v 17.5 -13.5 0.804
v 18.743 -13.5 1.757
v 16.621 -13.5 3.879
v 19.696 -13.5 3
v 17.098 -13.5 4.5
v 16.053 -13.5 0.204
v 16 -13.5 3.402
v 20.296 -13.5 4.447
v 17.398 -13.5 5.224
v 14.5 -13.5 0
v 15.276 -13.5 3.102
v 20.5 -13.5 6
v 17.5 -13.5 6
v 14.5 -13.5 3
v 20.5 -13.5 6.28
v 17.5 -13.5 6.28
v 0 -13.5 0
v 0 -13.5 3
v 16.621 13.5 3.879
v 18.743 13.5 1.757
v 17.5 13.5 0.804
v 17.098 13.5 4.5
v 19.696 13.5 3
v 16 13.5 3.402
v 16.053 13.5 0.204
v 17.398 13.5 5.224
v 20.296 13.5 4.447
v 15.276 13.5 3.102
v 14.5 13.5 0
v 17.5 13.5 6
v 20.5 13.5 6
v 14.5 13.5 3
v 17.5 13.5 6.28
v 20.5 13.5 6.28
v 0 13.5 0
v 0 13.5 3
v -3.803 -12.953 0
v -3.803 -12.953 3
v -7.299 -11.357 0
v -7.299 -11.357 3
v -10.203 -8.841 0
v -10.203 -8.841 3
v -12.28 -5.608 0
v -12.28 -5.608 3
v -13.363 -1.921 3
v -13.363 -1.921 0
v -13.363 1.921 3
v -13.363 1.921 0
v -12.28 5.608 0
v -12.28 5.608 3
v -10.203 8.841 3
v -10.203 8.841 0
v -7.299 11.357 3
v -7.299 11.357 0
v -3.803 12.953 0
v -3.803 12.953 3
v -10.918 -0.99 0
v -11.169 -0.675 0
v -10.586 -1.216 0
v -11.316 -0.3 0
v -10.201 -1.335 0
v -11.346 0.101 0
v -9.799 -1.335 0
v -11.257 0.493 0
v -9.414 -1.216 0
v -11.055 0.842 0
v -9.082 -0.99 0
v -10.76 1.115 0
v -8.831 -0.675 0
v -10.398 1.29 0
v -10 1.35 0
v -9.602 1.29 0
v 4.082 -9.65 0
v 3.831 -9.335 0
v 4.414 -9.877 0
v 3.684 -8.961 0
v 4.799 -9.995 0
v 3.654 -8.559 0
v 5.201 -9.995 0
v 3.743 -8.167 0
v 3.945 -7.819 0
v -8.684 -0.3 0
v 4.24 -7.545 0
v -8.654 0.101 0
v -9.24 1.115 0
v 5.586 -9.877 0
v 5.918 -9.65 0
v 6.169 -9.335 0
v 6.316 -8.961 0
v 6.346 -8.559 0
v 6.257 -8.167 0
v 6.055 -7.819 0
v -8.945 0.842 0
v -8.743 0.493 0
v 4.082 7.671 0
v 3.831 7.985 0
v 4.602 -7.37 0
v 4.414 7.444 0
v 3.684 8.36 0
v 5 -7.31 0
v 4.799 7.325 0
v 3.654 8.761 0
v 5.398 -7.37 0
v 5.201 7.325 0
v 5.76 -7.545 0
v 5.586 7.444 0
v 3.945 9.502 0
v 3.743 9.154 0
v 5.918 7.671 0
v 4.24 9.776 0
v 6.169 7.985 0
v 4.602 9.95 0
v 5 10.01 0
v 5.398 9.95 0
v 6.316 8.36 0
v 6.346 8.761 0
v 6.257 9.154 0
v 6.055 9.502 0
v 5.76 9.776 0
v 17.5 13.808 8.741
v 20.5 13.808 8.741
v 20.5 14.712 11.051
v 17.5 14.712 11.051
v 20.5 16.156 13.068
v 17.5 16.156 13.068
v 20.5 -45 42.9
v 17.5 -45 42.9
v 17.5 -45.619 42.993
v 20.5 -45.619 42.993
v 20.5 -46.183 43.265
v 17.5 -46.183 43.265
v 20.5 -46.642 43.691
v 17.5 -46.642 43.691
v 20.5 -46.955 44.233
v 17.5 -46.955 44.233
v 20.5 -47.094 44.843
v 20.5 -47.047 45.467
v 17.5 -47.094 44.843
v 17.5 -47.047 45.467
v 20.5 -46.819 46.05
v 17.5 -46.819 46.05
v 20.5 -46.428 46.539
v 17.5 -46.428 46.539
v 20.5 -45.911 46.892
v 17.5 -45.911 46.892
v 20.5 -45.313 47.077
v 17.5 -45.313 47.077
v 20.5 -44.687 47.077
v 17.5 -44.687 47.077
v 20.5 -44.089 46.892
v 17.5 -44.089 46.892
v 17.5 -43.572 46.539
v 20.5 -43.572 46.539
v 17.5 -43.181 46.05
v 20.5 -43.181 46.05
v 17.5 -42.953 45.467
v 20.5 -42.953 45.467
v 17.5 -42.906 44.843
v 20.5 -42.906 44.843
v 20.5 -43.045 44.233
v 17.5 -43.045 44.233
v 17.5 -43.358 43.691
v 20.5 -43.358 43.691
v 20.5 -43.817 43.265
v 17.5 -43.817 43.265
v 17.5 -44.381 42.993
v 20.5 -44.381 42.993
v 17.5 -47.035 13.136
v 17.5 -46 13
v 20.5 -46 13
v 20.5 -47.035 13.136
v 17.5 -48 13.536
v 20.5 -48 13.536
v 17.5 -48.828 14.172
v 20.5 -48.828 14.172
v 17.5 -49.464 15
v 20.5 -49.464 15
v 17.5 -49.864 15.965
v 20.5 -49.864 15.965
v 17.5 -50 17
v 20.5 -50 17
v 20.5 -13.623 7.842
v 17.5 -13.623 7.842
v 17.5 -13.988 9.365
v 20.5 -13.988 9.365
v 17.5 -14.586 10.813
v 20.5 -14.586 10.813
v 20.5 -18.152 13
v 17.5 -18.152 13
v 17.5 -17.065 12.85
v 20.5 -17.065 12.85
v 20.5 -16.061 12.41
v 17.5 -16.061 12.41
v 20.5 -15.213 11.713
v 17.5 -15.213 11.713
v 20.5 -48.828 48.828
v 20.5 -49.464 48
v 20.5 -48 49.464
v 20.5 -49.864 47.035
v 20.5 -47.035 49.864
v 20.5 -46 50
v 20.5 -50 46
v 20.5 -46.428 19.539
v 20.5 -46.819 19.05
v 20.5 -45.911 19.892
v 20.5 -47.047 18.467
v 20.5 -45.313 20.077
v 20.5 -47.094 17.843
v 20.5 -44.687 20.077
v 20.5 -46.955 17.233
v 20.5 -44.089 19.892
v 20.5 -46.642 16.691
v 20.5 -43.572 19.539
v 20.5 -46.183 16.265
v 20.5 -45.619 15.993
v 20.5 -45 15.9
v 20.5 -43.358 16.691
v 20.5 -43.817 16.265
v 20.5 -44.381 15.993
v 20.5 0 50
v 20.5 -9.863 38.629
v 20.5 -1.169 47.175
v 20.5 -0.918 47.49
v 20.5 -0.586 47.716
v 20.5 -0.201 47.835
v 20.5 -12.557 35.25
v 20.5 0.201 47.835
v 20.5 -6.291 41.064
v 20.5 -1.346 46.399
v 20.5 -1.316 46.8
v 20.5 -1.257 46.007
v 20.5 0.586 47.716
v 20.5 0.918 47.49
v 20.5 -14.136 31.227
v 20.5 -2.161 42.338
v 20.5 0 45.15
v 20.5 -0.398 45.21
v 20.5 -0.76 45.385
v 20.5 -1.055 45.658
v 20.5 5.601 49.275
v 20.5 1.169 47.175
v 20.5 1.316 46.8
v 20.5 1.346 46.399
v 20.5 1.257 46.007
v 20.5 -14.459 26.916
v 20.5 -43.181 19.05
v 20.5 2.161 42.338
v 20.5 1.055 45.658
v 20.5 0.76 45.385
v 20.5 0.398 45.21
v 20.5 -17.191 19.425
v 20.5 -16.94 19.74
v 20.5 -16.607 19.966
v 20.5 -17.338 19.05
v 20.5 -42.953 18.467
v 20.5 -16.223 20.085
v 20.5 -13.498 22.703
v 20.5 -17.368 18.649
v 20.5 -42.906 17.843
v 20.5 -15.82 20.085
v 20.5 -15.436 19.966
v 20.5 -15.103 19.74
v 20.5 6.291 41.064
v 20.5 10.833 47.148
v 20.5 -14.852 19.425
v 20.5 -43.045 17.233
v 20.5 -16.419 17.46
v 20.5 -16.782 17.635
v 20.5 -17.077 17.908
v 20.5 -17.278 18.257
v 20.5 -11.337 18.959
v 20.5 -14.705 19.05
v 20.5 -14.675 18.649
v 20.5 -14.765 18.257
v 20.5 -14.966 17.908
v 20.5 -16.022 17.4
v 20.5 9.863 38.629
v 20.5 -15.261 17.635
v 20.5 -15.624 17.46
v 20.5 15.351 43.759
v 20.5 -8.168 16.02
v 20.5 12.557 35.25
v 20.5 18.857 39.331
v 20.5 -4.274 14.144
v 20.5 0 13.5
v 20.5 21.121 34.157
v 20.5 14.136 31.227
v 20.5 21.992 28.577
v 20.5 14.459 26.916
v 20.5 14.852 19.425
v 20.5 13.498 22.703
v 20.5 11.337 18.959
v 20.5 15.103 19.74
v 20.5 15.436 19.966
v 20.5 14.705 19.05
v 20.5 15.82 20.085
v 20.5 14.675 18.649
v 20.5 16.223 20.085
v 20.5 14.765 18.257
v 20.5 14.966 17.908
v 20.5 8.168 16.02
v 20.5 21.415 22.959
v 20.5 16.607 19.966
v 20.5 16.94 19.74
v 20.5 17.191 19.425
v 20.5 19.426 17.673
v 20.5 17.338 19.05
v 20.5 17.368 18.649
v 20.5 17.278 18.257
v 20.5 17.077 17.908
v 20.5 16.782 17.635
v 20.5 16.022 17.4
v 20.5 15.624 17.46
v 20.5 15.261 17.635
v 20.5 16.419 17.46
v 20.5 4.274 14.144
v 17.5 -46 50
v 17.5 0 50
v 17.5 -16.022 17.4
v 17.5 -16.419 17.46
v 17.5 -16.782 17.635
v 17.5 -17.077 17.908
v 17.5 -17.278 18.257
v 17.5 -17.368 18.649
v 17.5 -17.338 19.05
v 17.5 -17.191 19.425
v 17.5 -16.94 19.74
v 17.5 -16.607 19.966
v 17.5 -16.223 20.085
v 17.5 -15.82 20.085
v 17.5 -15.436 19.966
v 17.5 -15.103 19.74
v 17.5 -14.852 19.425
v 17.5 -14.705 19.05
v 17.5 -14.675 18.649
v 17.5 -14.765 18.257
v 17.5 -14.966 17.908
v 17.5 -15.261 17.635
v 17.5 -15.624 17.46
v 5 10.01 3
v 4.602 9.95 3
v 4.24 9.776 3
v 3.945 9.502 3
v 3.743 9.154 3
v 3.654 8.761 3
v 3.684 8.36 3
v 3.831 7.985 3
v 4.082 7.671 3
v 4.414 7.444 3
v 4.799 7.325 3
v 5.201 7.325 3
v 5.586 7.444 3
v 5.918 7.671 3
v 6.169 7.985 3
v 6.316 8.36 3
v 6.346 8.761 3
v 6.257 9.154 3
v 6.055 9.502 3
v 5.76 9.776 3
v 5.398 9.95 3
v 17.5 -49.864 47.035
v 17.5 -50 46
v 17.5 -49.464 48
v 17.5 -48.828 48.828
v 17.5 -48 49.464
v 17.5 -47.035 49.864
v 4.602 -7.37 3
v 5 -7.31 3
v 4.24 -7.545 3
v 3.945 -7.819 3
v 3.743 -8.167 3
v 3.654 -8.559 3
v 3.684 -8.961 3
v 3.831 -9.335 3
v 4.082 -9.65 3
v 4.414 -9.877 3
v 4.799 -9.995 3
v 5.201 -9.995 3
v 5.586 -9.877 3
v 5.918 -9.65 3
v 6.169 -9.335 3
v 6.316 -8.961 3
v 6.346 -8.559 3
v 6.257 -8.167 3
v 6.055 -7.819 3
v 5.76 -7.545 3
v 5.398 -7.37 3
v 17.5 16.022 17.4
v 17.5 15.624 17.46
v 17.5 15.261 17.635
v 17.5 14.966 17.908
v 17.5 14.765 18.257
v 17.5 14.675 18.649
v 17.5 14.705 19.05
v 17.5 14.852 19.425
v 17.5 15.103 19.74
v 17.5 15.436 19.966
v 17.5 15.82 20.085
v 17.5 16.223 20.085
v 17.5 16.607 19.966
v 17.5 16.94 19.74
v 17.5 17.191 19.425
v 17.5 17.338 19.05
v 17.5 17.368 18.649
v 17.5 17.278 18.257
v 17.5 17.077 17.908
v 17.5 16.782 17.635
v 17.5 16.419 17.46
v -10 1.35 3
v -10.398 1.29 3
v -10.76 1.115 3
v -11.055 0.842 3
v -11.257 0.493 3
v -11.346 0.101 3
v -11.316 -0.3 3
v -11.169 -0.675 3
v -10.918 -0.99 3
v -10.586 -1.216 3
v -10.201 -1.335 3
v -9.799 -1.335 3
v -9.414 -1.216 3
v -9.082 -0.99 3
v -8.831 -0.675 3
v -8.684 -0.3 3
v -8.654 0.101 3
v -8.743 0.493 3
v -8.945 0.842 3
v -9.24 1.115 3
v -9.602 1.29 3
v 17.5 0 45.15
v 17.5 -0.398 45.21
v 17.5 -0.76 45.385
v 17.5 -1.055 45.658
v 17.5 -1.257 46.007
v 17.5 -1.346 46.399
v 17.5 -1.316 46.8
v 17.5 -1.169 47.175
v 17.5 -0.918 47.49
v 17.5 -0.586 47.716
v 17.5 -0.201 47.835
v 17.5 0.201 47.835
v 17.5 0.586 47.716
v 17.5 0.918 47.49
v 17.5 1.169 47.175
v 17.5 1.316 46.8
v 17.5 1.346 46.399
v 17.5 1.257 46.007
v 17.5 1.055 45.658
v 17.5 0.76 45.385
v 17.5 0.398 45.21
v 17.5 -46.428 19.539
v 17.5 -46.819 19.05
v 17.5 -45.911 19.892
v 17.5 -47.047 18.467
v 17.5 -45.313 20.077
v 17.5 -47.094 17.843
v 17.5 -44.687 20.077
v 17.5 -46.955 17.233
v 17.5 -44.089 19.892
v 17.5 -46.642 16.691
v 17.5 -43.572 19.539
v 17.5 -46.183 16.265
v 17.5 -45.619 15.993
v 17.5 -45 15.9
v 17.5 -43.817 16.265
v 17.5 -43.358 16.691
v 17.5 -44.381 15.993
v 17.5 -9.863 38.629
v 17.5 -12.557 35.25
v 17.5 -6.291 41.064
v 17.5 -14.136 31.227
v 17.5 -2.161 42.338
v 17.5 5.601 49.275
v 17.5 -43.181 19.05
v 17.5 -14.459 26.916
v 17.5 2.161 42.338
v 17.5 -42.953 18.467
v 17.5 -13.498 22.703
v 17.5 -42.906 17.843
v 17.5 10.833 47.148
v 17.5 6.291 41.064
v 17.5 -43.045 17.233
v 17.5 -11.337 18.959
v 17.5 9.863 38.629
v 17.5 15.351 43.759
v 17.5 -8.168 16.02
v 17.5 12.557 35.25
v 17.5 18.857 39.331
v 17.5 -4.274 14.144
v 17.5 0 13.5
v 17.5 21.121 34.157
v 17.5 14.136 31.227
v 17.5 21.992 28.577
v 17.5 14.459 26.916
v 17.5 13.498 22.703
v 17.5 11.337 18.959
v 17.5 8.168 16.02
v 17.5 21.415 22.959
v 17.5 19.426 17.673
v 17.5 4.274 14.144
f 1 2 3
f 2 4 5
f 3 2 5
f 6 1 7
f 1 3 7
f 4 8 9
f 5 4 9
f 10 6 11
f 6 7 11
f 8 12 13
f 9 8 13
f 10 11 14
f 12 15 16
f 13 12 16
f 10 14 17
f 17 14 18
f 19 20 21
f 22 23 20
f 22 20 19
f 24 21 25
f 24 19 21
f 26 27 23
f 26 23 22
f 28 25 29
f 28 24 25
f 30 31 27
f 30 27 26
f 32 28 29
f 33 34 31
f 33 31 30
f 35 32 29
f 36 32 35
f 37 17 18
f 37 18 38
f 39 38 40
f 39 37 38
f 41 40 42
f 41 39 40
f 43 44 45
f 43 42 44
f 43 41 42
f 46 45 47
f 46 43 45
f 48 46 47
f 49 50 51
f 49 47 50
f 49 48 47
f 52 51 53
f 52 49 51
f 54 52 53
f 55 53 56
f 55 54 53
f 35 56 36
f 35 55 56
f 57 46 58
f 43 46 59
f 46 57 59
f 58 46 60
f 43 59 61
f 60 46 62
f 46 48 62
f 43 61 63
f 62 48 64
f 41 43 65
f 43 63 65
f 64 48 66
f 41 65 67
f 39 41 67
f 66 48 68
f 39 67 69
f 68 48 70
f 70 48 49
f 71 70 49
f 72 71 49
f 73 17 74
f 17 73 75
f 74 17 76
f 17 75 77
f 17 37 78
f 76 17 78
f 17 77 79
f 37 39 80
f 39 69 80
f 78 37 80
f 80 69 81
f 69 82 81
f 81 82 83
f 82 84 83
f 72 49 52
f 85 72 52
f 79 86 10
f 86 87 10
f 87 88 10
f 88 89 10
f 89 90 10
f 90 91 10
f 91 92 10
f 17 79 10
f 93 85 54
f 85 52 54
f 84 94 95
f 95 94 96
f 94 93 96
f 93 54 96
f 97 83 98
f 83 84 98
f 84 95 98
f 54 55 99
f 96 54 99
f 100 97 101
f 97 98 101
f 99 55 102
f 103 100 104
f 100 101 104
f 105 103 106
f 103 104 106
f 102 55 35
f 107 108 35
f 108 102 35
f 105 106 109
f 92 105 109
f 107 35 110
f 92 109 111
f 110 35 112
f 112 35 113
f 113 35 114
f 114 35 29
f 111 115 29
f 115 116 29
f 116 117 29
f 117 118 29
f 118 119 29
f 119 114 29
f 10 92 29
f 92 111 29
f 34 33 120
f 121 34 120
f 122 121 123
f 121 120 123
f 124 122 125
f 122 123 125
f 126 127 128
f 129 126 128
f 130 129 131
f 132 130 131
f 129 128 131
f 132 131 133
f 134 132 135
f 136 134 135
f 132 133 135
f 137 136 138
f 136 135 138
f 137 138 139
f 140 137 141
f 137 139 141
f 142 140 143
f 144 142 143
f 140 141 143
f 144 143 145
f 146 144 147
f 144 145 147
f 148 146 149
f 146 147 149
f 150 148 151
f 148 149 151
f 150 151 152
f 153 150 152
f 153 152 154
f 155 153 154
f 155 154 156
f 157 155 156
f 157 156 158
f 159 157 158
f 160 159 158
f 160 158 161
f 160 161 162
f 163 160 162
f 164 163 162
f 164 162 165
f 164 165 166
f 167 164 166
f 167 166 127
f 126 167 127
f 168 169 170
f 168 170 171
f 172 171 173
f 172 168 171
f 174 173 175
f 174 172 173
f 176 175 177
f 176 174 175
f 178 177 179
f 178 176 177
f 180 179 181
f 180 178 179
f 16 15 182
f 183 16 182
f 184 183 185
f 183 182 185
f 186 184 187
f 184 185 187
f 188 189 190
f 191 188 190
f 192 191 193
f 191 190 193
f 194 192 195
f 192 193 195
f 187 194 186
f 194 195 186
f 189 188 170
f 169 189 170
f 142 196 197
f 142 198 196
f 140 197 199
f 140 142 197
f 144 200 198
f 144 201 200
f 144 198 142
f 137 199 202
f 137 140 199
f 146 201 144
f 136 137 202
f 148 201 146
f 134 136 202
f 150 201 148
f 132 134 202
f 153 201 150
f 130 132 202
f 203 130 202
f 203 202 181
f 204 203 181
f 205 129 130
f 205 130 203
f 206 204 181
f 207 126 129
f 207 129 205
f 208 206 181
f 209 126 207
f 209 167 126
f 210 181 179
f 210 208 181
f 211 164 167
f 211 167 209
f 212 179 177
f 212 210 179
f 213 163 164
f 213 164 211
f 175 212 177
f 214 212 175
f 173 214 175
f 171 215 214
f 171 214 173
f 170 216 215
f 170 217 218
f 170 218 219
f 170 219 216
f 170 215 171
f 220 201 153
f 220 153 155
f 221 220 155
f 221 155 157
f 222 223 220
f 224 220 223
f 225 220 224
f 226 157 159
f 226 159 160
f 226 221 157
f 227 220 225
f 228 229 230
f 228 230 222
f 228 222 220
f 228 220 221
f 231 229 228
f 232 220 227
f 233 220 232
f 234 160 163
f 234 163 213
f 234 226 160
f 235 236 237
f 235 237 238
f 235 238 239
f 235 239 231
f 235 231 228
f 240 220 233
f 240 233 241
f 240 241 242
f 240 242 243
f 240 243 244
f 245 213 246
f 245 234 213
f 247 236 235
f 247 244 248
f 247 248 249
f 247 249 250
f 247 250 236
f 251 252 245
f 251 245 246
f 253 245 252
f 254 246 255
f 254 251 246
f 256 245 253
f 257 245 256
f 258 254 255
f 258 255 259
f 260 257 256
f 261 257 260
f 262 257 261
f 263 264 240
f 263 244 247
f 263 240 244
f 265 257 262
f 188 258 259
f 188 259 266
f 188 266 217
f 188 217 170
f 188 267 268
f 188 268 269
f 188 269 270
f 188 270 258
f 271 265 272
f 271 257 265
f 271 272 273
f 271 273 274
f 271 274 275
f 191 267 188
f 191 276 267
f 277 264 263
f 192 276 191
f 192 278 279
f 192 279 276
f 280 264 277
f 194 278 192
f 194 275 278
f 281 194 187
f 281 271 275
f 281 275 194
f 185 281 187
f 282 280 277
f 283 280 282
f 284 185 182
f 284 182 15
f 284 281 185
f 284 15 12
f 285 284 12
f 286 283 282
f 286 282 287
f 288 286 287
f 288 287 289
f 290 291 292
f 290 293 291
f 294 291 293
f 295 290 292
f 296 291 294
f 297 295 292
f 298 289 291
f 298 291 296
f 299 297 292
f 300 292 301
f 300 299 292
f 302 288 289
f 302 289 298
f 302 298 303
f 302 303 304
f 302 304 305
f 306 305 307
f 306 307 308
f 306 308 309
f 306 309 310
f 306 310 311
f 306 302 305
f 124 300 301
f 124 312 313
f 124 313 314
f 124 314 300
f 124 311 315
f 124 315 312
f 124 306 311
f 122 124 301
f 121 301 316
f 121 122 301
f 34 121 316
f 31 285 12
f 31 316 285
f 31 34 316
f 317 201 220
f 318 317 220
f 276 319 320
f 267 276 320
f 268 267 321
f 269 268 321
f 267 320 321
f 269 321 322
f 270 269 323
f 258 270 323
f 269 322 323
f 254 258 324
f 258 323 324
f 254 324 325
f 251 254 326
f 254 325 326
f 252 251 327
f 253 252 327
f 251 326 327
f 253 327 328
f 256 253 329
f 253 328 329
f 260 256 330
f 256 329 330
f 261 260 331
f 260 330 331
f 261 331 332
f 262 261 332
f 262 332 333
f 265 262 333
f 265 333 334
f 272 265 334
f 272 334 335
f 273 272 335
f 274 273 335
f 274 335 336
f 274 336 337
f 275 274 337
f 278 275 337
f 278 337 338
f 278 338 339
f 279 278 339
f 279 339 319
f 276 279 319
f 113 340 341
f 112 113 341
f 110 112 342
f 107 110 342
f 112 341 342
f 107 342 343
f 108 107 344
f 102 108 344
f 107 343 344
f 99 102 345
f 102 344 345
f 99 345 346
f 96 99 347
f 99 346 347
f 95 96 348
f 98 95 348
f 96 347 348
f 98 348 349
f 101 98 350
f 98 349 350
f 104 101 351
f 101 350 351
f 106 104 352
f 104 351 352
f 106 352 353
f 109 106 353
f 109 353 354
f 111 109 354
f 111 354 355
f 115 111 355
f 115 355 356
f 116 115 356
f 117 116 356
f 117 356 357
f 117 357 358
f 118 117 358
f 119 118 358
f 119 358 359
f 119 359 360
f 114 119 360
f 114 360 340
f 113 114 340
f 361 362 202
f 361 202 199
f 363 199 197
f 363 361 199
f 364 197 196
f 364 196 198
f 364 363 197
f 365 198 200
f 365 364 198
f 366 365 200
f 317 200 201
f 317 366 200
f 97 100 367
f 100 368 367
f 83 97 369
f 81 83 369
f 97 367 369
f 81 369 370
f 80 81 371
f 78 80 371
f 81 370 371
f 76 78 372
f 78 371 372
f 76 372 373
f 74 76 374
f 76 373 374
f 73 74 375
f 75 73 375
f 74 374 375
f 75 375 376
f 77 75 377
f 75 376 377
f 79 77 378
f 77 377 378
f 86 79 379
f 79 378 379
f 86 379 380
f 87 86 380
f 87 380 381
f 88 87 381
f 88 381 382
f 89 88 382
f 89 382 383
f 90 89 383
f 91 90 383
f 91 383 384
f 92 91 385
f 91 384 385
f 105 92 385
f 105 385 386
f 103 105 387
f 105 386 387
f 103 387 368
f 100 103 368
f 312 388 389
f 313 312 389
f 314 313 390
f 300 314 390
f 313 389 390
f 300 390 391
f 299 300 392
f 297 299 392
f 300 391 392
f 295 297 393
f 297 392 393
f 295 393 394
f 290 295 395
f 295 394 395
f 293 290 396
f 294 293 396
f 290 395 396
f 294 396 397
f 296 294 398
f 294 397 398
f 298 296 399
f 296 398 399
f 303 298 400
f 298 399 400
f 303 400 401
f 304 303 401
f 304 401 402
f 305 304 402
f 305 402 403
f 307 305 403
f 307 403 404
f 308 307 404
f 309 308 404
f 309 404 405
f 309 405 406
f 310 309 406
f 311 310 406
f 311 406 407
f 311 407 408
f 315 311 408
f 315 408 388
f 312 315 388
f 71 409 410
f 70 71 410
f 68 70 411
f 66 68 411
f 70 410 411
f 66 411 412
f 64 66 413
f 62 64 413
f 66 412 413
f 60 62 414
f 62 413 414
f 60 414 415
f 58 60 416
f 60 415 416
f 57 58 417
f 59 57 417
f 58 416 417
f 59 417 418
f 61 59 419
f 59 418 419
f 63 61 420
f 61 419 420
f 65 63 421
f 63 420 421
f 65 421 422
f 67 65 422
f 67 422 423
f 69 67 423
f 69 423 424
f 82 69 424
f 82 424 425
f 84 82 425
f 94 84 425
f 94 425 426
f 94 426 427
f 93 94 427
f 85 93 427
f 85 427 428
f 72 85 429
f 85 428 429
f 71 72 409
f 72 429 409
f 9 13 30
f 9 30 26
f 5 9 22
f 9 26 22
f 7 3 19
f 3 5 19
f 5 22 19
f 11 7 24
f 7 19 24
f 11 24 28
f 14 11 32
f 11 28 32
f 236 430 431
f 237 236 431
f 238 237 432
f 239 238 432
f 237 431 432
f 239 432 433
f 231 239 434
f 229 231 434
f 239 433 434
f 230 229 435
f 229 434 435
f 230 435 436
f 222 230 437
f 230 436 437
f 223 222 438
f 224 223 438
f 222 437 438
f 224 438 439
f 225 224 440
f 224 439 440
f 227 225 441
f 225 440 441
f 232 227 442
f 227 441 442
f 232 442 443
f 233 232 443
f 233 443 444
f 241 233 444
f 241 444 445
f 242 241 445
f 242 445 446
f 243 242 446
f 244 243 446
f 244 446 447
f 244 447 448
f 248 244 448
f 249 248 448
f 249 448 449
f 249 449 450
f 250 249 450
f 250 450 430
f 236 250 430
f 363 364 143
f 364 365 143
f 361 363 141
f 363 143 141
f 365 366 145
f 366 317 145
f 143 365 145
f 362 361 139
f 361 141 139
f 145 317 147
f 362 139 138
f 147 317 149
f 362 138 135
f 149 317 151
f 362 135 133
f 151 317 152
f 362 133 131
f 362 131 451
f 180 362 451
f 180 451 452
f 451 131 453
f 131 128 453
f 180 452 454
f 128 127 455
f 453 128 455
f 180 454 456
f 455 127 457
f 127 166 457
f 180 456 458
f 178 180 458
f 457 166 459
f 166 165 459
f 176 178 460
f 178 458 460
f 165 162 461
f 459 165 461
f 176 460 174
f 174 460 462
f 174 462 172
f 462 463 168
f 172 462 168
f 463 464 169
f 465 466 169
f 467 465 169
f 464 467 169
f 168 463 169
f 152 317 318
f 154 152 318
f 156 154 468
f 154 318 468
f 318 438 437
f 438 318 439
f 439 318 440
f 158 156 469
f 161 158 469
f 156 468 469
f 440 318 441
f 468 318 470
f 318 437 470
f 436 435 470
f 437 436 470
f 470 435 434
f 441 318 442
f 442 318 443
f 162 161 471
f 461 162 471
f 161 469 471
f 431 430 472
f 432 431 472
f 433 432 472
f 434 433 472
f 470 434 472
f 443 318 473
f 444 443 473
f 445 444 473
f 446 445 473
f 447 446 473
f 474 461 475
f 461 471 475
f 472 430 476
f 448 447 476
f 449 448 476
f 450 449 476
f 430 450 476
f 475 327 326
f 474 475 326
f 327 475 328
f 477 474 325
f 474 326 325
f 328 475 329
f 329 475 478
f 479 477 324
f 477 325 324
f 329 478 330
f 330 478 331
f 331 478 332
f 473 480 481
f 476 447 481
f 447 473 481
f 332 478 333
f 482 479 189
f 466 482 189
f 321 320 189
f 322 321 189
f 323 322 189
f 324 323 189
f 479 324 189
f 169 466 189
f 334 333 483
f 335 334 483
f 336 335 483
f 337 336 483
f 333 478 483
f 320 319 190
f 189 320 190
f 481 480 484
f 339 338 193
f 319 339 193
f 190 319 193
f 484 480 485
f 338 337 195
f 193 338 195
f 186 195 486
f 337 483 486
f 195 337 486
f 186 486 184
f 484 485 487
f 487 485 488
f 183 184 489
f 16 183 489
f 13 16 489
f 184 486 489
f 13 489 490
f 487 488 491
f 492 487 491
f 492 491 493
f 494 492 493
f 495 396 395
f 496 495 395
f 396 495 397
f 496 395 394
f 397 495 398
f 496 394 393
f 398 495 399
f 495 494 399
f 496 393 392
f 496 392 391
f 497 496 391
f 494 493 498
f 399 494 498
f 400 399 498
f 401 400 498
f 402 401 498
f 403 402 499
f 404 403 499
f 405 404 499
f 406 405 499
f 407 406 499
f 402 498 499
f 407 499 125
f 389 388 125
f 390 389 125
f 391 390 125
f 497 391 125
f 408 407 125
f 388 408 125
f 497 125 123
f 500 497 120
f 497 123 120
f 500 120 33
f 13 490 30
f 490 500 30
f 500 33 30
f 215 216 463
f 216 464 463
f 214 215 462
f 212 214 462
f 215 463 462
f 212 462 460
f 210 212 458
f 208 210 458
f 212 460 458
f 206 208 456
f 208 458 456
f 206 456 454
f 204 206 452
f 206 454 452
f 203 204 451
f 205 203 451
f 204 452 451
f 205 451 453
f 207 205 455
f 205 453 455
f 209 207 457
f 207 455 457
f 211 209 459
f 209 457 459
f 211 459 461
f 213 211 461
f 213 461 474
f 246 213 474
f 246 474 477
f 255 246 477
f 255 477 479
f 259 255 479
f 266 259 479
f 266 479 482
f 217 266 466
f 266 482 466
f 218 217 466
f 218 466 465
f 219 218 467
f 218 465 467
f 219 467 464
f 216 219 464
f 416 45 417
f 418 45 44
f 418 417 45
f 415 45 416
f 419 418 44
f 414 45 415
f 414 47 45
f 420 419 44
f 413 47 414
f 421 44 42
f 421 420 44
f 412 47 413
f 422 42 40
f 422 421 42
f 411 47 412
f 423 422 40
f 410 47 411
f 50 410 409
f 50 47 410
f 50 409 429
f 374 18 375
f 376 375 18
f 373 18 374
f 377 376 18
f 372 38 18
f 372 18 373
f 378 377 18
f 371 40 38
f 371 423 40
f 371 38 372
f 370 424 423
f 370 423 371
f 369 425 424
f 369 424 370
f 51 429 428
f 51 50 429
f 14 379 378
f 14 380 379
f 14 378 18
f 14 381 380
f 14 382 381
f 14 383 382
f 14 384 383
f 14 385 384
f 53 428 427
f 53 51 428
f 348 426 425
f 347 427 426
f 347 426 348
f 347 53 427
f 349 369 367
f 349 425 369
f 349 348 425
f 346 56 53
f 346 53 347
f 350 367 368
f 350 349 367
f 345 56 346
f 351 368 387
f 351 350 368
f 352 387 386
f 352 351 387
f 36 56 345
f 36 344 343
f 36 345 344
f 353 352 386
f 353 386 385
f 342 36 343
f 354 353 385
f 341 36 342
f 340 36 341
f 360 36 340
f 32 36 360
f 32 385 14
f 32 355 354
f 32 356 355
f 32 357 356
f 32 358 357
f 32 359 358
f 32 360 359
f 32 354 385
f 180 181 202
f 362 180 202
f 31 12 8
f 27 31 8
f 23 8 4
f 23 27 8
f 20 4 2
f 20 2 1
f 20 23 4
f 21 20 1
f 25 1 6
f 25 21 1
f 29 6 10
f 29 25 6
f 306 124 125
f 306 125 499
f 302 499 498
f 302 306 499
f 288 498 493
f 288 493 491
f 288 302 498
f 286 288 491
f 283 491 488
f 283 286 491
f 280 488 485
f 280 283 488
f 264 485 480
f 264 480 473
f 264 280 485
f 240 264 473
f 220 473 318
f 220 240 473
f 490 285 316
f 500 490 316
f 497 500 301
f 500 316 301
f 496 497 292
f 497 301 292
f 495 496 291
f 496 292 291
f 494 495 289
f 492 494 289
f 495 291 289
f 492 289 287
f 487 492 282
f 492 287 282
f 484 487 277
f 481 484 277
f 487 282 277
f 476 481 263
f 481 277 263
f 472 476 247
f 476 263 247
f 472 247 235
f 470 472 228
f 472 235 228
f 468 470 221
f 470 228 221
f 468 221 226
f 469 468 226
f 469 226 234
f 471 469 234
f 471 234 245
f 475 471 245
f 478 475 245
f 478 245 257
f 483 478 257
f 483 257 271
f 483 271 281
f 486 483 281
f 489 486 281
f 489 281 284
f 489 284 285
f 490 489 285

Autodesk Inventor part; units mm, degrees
ref_plane "YZ Plane" through (0, 0, 0) normal (1, 0, 0) x (0, 1, 0)
ref_plane "XZ Plane" through (0, 0, 0) normal (0, 1, 0) x (-1, 0, 0)
ref_plane "XY Plane" through (0, 0, 0) normal (0, 0, 1) x (1, 0, 0)
sketch "スケッチ1" plane through (0, 0, 0) normal (0, 0, 1) x (1, 0, 0)
  circle A0 centre (0, 0) radius 13.5
  line L0 (0, 13.5) -> (14.5, 13.5)
  line L1 (14.5, 13.5) -> (14.5, -13.5)
  line L2 (14.5, -13.5) -> (0, -13.5)
  line L3 (0, -13.5) -> (0, 13.5)
  line L4 (0, 0) -> (14.5, 0) construction
  point P0 (0, 13.5)
  point P1 (0, -13.5)
  point P2 (0, -13.5)
  dimension "d0" = 27
  dimension "d1" = 27
  dimension "d2" = 14.5
extrude "プレート1" add sketch "スケッチ1" along normal blind 3
sketch "スケッチ2" plane through (17.5, 13.5, 6) normal (1, 0, 0) x (0, 1, 0)
  line L0 (-27, 0) -> (0, 0)
  line L1 (0, 0) -> (0, 19)
  line L2 (0, 19) -> (-27, 19)
  line L3 (-27, 19) -> (-27, 0)
edge flange "フランジ1" height 25 angle 90 thickness 3 bend radius 3 thickness toward (1, 0, 0) relief tear relief width 3 relief depth 1.5 edges at (14.5, 0, 3) wall of the first edge with corners at (17.5, -13.5, 6) (17.5, 13.5, 6) (17.5, 13.5, 25) (17.5, -13.5, 25)
bend "曲げ1"
corner "コーナー1"
sketch "スケッチ3" plane through (0, 0, 0) normal (0, 0, -1) x (-1, 0, 0)
  point P0 (0, 0)
  point P1 (10, 0)
  point P2 (-5, 8.6603)
  point P3 (-5, -8.6603)
  dimension "d14" = 10
  dimension "d17" = 360
hole "穴1" at (-10, 0, 0) at (5, 8.6603, 0) at (5, -8.6603, 0) direction (0, 0, 1) diameter 2.7 depth 3
sketch "スケッチ4" plane through (20.5, -13.5, 25) normal (1, 0, 0) x (0, 0, -1)
  circle A0 centre (-3, 13.5) radius 22
  line L0 (25, 27) -> (25, 0) projected
  line L1 (0, 27) -> (19, 27) projected
  point P0 (25, 13.5)
  dimension "d26" = 44
  dimension "d29" = 28
  dimension "d62" = 13.5
extrude "押し出し1" add sketch "スケッチ4" against normal up to surface (3 mm away)
sketch "スケッチ5" plane through (20.5, -13.5, 6) normal (1, 0, 0) x (0, 0, -1)
  arc A0 (-4.629, 27) -> (-4.629, 0) centre (-22, 13.5) ccw projected
  circle A1 centre (-22, 13.5) radius 14.5
  point P0 (6, 13.5)
  dimension "d30" = 29
extrude "押し出し2" cut sketch "スケッチ5" against normal up to surface (3 mm away)
sketch "スケッチ6" plane through (20.5, 0, 28) normal (1, 0, 0) x (0, 0, 1)
  point P0 (-28, 0)
sketch "スケッチ7" plane through (20.5, -13.5, 6) normal (1, 0, 0) x (0, 0, -1)
  circle A0 centre (-22, 13.5) radius 14.5 projected
  point P0 (6, 13.5)
  point P1 (-40.5, 13.5)
  point P2 (-12.75, -2.5215)
  point P3 (-12.75, 29.5215)
  dimension "d33" = 18.5
  dimension "d36" = 360
hole "穴2" at (20.5, 0, 46.5) at (20.5, -16.0215, 18.75) at (20.5, 16.0215, 18.75) direction (-1, 0, 0) diameter 2.7 depth 3
fillet "フィレット1" radius 10 2 edges at (19, 13.5, 10.629) (19, -13.5, 10.629)
sketch "スケッチ8" plane through (20.5, -13.5, 6) normal (1, 0, 0) x (0, 0, -1)
  arc A0 (-7.0676, 29.6563) -> (-7.0676, -2.6562) centre (-22, 13.5) ccw projected
  line L0 (-44, 13.5) -> (-7, 13.5)
  line L1 (-7, 13.5) -> (-7, -36.5)
  line L2 (-7, -36.5) -> (-44, -36.5)
  line L3 (-44, -36.5) -> (-44, 13.5)
  arc A1 (-7.0676, 29.6562) -> (-0.2802, 27) centre (-0.2802, 37) ccw projected
  line L4 (0, 0) -> (0, 27) projected
  line L5 (0, 0) -> (-0.2802, 0) projected
  arc A2 (-0.2802, 0) -> (-7.0676, -2.6562) centre (-0.2802, -10) ccw projected
  arc A3 (-7.0676, 29.6562) -> (-7.0676, -2.6562) centre (-22, 13.5) ccw projected
  circle A4 centre (-12.75, 29.5215) radius 1.35 projected
  circle A5 centre (-12.75, -2.5215) radius 1.35 projected
  circle A6 centre (-22, 13.5) radius 14.5 projected
  circle A7 centre (-40.5, 13.5) radius 1.35 projected
  point P0 (6, 13.5)
  point P1 (-11.4, 29.5215)
  point P2 (-11.4, 29.5215)
  point P3 (-11.4, -2.5215)
  point P4 (-11.4, -2.5215)
  point P5 (-7.5, 13.5)
  point P6 (-7.5, 13.5)
  point P7 (-39.15, 13.5)
  point P8 (-39.15, 13.5)
  point P9 (-7, -2.5943)
  point P10 (-7.0676, -2.6562)
  dimension "d46" = 50
  dimension "d47" = 37
extrude "押し出し3" add sketch "スケッチ8" against normal up to surface (3 mm away) contours A0 A2 L1 L2 L3
fillet "フィレット2" radius 4 1 edges at (19, -16.0943, 13)
fillet "フィレット3" radius 4 2 edges at (19, -50, 13) (19, -50, 50)
sketch "スケッチ9" plane through (20.5, -13.5, 6) normal (1, 0, 0) x (0, 0, -1)
  line L0 (-44, 13.5) -> (-44, -32.5) projected
  line L1 (-44, -31.5) -> (-6.9219, -31.5) construction
  line L2 (-40, -36.5) -> (-11, -36.5) projected
  line L3 (-7, -32.5) -> (-7, -4.6519) projected
  point P0 (6, 13.5)
  point P1 (-39, -31.5)
  point P2 (-12, -31.5)
  dimension "d52" = 5
  dimension "d53" = 5
  dimension "d54" = 5
hole "穴3" at (20.5, -45, 45) at (20.5, -45, 18) direction (-1, 0, 0) diameter 4.2 depth 3
equation "\"d24\" = Thickness"
equation "\"d60\" = Thickness"
equation "\"d3\" = Thickness"
equation "\"d4\" = BendReliefWidth"
equation "\"d5\" = BendReliefDepth"
equation "\"d6\" = MinimumRemnant"
equation "\"d7\" = TransitionRadius"
equation "\"d10\" = BendRadius"
equation "\"d11\" = CornerReliefSize"
equation "\"d12\" = GapSize"
equation "\"d13\" = JacobiRadiusSize"
equation "\"BendRadius\" = Thickness"
equation "\"BendReliefWidth\" = Thickness"
equation "\"BendReliefDepth\" = 0.5 * Thickness"
equation "\"CornerReliefSize\" = 4 * Thickness"
equation "\"MinimumRemnant\" = 2 * Thickness"
equation "\"TransitionRadius\" = BendRadius"
equation "\"JacobiRadiusSize\" = BendRadius"
equation "\"GapSize\" = Thickness"
equation "\"Thickness\" = 3"
properties part number "hand_plate" material "アルミニウム 6061"
